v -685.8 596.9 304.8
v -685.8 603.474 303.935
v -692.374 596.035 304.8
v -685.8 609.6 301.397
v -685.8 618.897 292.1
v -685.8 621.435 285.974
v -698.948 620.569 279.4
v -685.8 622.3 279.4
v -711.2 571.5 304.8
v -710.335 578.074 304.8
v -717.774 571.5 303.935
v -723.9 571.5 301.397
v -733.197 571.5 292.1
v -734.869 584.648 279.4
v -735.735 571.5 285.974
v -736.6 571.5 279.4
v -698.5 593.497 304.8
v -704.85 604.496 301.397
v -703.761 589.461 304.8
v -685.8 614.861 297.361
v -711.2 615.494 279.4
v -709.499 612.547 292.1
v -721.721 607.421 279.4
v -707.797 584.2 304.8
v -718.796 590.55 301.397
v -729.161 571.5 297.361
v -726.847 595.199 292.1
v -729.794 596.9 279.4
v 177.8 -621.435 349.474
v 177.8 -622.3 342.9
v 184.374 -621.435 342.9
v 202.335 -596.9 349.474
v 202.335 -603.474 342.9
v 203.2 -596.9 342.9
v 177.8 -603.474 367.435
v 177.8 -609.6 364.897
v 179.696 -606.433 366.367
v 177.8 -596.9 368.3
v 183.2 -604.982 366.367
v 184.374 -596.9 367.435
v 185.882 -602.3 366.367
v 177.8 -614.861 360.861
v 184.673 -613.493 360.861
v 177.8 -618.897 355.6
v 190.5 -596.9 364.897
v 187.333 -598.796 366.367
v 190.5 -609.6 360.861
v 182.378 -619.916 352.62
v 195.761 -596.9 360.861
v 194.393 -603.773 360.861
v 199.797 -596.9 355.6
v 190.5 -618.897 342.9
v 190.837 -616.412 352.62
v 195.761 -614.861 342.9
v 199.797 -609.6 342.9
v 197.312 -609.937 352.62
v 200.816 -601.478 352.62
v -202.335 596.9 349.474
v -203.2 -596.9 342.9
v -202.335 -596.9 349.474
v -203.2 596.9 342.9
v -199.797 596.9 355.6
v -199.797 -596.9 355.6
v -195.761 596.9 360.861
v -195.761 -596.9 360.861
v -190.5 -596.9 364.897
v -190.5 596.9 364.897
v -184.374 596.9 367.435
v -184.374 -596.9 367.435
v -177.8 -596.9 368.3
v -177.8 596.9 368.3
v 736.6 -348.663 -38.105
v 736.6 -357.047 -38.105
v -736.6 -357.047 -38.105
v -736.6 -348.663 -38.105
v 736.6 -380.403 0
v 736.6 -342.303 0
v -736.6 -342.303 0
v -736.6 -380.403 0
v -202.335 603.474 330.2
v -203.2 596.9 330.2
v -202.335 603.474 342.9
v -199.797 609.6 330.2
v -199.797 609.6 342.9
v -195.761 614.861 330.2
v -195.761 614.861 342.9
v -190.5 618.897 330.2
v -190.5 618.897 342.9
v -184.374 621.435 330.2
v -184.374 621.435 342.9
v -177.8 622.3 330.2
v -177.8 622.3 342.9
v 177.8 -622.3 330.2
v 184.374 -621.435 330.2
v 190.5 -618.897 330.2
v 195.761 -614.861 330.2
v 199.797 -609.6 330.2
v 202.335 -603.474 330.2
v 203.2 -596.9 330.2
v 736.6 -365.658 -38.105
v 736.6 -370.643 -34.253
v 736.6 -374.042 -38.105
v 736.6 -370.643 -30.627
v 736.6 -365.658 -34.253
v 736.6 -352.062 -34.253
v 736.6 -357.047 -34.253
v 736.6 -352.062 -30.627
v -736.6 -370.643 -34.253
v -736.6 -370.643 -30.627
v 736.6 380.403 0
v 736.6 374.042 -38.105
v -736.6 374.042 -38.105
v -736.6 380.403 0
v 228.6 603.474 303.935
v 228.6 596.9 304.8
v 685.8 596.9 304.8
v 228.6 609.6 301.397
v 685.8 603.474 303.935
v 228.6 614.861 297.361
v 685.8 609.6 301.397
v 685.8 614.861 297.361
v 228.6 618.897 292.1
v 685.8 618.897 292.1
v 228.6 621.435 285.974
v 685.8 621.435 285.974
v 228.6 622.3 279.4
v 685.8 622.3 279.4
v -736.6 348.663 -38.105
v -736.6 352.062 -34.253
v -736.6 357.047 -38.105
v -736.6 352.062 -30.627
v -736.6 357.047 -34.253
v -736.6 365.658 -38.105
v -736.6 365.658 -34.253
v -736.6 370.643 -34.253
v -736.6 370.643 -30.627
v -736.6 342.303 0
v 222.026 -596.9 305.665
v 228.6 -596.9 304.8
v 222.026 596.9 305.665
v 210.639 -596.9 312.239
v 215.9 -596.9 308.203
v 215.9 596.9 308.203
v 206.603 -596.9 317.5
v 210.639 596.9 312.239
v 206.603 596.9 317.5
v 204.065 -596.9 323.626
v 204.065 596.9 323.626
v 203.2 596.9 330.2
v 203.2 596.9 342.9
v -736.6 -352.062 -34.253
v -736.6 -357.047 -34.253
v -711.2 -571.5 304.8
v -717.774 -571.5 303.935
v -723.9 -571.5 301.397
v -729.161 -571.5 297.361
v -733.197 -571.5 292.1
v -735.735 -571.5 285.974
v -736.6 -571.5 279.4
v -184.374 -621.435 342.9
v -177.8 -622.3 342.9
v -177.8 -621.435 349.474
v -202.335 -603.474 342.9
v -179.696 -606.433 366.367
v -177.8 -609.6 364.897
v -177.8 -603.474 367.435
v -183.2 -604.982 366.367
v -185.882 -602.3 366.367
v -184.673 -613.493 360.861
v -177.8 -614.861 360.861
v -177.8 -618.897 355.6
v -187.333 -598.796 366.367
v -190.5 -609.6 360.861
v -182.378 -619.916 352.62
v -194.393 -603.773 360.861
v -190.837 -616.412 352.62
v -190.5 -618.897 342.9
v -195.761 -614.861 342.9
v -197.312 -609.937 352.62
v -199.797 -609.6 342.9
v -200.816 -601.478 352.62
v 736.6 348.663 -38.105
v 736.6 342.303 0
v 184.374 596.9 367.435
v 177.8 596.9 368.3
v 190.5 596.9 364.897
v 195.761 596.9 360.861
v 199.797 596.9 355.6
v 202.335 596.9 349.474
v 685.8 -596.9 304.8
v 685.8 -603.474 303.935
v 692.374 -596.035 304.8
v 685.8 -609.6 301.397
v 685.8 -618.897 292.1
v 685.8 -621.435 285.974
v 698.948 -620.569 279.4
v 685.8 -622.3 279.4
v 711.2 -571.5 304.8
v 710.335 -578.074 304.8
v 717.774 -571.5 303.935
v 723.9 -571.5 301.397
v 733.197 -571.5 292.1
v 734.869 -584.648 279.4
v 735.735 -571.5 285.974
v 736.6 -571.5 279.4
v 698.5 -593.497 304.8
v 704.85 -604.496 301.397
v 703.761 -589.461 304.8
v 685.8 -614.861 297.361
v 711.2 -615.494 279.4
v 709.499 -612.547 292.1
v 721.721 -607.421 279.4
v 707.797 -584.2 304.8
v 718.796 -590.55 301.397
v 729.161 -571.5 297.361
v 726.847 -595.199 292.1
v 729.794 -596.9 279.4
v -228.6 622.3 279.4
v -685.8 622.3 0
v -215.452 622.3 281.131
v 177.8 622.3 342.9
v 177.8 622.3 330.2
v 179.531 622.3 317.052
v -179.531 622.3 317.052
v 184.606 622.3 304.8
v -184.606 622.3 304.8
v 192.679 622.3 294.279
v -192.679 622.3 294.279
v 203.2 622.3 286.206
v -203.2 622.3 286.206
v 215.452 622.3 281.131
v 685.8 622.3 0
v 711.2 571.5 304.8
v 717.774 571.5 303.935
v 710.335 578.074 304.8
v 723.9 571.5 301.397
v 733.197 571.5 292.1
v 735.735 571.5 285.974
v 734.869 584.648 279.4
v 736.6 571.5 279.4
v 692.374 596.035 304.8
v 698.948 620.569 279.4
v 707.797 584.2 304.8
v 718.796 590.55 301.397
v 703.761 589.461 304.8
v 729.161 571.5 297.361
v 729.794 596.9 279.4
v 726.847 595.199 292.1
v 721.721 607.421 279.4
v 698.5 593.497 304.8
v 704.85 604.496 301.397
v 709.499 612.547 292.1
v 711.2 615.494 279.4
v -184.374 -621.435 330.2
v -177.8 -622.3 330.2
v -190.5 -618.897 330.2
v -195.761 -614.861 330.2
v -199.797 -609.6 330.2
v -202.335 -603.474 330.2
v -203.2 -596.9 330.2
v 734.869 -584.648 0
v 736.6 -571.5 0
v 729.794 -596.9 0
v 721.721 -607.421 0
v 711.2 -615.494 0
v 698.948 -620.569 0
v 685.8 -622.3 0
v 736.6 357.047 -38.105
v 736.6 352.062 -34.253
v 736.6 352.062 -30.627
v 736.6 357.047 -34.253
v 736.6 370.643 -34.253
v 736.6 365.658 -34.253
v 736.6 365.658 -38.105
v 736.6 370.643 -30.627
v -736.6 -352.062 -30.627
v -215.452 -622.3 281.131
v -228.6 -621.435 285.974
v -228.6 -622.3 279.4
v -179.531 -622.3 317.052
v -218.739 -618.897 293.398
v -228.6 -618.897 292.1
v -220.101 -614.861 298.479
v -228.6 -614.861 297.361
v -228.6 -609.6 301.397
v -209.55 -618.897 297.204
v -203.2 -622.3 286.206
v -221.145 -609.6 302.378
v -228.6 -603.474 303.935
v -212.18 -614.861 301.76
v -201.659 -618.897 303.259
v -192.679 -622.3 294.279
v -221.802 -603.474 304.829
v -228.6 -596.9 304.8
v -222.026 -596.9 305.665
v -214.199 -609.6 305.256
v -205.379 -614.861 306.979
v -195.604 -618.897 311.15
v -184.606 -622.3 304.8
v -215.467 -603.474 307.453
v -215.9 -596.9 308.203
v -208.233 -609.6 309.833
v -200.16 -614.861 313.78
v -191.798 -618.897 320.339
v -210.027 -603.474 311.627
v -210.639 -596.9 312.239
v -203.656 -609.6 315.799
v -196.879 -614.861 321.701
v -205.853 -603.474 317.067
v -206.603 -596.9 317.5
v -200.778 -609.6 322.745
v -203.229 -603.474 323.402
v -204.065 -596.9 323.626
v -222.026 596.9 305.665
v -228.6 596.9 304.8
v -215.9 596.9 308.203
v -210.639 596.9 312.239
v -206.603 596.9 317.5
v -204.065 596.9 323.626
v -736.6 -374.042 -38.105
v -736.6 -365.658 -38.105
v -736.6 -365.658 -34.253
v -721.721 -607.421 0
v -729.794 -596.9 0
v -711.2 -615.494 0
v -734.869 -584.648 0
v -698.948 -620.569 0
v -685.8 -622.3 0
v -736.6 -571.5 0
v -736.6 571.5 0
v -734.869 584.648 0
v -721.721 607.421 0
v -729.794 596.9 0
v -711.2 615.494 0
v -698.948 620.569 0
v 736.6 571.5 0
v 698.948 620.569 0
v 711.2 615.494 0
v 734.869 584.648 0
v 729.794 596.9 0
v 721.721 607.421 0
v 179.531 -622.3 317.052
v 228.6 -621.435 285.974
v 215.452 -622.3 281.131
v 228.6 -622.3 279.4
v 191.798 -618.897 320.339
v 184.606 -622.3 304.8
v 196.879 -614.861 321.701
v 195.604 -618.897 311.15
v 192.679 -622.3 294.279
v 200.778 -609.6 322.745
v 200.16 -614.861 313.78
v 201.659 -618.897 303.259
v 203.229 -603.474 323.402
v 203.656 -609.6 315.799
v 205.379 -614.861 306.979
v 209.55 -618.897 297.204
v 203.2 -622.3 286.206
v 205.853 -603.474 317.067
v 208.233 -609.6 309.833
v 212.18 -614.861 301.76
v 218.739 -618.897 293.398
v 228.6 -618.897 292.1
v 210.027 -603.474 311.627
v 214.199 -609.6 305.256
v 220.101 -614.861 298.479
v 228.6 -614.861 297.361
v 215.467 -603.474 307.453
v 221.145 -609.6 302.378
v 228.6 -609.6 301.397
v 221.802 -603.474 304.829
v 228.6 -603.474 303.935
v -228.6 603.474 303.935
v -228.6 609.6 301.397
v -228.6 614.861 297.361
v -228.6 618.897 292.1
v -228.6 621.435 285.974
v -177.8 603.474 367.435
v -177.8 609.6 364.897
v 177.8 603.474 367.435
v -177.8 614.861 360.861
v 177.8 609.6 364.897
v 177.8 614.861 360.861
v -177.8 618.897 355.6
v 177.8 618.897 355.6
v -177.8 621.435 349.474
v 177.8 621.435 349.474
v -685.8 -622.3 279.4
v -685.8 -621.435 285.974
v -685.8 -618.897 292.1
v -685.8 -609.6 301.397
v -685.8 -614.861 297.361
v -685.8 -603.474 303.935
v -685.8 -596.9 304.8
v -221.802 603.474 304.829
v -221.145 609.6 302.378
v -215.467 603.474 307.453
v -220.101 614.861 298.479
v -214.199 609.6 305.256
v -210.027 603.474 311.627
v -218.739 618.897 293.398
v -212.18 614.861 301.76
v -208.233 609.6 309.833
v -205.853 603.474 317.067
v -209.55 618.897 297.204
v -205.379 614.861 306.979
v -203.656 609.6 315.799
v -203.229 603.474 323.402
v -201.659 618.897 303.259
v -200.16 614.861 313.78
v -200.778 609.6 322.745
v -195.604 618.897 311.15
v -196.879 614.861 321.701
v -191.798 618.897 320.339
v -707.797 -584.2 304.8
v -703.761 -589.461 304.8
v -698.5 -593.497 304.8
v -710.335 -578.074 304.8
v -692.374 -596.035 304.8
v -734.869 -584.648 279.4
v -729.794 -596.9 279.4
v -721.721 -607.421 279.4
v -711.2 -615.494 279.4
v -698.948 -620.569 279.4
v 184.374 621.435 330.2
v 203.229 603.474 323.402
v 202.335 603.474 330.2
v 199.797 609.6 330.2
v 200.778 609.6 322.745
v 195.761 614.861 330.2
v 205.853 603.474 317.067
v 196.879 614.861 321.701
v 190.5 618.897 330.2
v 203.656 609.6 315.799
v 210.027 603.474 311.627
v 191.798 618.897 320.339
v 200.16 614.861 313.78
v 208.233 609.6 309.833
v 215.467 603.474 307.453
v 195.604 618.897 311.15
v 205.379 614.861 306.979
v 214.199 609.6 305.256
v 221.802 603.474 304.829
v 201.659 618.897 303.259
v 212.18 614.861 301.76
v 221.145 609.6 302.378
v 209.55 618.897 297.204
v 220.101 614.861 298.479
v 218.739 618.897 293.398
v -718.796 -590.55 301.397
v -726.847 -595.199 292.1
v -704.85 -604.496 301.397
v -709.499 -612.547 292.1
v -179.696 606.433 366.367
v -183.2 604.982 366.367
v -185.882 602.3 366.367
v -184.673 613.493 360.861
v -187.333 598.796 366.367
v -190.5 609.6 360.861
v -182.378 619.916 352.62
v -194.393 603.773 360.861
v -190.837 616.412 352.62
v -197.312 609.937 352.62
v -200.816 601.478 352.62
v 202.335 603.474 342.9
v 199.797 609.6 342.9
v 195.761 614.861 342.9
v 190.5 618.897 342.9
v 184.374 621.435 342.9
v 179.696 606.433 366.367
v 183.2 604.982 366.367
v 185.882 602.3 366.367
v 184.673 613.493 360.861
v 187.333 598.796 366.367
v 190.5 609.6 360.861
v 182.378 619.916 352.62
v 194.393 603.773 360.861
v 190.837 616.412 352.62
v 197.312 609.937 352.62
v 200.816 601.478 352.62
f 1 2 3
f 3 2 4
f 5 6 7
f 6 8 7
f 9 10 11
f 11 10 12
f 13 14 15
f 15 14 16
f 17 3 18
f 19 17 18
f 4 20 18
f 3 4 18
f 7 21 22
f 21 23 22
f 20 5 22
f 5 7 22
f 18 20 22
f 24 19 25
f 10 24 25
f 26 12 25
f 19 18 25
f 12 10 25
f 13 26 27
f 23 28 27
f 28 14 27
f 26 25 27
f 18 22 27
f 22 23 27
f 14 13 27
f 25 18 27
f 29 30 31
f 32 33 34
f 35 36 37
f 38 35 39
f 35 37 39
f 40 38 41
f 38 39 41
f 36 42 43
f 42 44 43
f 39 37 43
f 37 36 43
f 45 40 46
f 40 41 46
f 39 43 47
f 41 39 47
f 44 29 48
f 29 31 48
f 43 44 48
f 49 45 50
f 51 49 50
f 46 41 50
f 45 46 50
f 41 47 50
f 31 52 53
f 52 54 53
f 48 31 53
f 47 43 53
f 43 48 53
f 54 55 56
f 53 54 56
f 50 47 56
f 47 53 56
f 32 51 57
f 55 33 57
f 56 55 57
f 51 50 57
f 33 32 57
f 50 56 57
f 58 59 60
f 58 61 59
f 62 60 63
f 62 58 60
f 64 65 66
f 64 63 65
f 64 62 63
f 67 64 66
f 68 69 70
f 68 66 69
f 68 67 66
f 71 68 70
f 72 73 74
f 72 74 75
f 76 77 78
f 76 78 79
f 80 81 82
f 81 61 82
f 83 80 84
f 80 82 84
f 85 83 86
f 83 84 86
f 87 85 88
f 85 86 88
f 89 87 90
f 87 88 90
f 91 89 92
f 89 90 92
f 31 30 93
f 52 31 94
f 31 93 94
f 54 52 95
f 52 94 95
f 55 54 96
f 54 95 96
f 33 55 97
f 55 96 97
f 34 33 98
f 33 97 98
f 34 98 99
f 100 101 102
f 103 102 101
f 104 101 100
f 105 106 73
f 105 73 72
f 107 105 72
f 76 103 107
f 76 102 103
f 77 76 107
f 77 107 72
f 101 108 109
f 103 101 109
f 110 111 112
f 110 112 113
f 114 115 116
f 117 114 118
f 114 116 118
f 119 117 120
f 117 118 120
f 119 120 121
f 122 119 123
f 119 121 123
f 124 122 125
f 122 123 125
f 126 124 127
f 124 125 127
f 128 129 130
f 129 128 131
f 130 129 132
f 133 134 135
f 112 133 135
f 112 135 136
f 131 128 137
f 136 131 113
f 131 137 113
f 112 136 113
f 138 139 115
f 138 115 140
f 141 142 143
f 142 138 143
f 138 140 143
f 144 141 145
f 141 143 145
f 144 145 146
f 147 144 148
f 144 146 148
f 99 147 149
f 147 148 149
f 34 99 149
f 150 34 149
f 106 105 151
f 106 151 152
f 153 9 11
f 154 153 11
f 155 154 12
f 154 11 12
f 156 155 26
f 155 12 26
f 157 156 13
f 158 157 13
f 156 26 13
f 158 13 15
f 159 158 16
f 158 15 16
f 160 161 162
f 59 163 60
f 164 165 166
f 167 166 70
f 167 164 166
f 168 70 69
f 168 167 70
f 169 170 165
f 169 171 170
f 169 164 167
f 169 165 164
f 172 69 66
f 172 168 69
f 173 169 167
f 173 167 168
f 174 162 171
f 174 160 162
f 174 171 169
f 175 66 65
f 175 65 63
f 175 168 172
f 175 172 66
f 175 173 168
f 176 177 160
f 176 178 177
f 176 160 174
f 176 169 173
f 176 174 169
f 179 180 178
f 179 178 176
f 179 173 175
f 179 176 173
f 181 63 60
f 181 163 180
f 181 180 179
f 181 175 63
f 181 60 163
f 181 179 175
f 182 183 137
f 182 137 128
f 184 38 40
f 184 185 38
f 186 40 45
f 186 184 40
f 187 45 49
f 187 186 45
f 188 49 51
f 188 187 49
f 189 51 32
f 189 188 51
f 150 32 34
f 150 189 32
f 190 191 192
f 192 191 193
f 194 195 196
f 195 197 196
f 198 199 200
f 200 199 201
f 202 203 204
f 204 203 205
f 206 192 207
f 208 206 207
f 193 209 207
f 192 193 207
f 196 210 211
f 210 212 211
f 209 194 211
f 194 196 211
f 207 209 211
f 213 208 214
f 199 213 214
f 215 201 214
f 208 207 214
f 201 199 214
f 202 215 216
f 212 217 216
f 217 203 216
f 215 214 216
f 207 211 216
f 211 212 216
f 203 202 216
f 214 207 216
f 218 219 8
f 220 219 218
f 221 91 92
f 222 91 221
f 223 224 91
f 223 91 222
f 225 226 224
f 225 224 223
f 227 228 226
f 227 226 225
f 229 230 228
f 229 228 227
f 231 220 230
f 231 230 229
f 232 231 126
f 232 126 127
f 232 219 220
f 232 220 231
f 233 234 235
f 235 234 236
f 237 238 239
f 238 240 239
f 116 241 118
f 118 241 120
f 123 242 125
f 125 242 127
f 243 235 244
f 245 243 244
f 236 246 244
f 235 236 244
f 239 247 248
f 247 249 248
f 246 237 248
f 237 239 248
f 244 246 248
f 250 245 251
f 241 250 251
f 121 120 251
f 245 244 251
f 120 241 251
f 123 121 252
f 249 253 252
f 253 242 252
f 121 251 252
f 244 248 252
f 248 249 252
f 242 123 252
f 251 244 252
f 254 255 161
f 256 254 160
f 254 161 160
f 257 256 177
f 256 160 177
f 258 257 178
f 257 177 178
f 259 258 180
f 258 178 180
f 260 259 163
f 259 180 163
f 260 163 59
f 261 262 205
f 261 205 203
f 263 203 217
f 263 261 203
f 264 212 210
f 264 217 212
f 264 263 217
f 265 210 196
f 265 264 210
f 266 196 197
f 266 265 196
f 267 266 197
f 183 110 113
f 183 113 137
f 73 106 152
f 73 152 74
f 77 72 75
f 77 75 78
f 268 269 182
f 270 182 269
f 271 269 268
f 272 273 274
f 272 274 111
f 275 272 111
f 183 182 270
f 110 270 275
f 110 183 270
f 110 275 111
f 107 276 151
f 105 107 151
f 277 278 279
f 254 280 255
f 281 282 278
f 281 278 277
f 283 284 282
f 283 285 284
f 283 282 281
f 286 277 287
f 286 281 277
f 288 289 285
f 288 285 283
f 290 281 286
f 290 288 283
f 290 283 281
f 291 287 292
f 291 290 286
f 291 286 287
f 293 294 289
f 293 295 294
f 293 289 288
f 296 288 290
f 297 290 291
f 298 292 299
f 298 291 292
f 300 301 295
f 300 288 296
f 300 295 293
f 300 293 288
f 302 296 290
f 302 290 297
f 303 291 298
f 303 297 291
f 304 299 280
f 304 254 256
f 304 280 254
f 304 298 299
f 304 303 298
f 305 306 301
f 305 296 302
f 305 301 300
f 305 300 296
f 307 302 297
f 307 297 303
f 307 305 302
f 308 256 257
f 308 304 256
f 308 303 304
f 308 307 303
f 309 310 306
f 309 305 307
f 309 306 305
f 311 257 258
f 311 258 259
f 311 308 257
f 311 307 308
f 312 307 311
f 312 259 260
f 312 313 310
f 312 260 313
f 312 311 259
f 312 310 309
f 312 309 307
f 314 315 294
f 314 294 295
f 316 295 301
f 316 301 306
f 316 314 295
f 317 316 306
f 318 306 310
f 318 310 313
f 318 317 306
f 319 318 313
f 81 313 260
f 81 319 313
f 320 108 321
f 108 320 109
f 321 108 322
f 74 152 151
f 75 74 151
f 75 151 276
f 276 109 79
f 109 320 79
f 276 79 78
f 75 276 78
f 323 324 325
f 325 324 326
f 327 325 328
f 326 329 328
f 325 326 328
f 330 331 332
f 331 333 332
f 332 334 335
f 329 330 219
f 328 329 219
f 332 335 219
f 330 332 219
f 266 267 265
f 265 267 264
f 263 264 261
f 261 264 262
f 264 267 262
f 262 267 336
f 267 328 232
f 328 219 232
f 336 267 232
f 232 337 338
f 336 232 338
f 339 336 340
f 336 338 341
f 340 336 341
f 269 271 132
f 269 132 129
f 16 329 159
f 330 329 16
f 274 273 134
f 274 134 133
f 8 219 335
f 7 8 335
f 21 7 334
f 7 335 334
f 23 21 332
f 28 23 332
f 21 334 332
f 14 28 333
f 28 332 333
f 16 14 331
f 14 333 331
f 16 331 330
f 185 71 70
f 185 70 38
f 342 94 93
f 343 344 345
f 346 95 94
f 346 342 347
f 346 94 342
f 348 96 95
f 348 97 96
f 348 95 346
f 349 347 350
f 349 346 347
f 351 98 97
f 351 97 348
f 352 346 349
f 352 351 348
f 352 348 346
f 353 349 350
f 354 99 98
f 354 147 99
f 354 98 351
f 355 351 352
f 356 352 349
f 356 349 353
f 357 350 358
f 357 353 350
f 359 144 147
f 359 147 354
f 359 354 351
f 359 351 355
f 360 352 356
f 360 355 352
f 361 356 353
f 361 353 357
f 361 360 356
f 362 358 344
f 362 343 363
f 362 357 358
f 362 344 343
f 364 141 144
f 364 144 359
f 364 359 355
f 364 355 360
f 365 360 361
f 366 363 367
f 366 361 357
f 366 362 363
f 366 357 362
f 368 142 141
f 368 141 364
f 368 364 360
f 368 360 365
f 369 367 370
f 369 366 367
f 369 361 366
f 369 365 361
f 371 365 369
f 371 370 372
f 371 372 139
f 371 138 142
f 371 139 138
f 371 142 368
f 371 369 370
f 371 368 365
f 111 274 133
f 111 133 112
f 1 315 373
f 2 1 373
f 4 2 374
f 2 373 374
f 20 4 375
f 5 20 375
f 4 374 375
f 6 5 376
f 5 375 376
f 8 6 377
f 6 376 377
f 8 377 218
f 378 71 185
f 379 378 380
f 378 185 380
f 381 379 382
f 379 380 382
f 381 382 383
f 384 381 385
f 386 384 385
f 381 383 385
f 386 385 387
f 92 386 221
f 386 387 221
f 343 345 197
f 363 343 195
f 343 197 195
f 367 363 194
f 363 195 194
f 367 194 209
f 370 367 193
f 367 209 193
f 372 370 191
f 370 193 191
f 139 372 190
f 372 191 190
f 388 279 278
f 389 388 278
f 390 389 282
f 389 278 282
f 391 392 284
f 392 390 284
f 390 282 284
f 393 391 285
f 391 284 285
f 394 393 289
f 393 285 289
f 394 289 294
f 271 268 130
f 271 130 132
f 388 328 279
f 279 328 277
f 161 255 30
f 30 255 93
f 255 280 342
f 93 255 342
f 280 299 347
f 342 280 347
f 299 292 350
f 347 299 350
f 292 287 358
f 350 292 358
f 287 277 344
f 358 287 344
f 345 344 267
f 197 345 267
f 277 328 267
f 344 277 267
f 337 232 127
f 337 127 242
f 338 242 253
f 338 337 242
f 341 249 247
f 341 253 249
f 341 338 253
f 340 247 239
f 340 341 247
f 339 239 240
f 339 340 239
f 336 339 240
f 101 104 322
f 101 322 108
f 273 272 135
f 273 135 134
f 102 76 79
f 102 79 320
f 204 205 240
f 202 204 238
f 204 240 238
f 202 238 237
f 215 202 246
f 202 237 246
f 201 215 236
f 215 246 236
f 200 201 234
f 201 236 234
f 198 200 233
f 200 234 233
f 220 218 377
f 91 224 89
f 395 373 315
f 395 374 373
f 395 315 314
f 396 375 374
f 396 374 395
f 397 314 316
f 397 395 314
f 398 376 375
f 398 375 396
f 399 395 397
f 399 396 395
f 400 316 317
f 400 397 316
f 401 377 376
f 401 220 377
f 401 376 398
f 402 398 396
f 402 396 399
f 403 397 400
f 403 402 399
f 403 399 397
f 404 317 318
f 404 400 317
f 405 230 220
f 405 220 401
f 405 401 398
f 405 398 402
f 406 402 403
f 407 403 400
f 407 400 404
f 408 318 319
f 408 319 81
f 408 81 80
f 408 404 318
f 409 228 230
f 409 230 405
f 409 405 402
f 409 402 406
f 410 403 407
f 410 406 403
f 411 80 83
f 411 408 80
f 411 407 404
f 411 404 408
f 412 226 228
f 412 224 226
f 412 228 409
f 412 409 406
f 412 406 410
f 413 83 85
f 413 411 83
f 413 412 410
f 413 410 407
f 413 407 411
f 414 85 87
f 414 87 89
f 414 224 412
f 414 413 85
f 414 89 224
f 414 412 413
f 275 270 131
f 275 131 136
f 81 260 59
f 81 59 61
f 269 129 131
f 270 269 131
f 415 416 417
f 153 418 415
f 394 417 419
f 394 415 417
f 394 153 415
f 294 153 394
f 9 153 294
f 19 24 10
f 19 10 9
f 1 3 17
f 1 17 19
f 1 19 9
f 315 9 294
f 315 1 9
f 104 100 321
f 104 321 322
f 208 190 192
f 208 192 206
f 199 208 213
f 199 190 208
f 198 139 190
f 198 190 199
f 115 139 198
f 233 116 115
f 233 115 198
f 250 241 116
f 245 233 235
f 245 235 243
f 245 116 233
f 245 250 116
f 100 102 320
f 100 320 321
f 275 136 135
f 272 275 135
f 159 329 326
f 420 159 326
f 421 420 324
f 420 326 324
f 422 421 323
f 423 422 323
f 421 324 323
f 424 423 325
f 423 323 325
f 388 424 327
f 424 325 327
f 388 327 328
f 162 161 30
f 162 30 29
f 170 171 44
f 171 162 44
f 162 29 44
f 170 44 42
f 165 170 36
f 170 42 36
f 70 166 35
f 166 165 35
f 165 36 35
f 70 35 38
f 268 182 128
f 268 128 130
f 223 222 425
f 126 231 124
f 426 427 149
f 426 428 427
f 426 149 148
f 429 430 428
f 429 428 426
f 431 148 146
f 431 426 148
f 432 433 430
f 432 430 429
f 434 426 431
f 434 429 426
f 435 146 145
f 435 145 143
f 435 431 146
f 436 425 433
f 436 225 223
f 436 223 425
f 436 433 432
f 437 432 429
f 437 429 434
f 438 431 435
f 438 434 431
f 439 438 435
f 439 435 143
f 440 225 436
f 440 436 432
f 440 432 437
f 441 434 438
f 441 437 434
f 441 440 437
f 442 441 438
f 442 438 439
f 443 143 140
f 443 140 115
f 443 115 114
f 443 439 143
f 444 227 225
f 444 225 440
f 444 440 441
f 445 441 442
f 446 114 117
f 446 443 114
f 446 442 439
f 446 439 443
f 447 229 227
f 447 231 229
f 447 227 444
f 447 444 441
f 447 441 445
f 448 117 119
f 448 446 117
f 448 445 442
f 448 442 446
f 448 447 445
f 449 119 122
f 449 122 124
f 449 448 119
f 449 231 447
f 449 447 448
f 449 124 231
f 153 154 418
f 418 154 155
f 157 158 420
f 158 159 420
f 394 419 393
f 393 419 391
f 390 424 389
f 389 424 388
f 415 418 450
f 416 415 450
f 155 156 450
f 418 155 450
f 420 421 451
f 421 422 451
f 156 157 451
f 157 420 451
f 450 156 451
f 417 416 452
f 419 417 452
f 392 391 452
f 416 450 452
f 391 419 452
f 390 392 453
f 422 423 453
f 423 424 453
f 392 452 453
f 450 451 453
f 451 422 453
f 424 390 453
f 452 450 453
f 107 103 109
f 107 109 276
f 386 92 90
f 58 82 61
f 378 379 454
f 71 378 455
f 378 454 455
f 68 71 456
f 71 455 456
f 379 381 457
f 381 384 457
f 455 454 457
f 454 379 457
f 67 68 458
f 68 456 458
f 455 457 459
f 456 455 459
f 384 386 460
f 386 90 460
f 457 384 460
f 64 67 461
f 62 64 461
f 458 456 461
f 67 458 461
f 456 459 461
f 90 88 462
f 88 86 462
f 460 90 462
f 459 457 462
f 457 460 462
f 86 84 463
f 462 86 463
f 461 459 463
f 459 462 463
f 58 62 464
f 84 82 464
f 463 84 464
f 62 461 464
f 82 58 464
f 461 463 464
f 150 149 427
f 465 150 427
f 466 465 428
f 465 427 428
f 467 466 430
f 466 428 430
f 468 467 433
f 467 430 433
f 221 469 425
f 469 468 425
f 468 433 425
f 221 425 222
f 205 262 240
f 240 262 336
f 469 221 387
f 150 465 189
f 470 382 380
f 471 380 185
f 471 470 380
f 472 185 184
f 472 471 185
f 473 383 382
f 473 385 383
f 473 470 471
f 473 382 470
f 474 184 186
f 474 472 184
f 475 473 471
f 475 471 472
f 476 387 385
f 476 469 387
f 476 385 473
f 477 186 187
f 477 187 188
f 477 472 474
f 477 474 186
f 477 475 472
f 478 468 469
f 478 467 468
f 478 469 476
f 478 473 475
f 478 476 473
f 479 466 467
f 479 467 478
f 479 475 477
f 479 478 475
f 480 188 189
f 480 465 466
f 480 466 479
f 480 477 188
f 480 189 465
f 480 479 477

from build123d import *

# Parameters (mm, degrees)
F0_W         = 1473.2
F0_H         = 1244.6
F1_DEPTH     = 304.8
F2_W         = 406.4
F2_H         = 1244.6
F3_DEPTH     = 63.5
F5_F1_R      = 25.4
F5_F2_R      = 25.4
F6_T1_DEPTH  = 431.8
F6_T4_ANGLE  = 90
F6_T6_ANGLE  = 90
F6_T8_ANGLE  = 90
F6_T10_ANGLE = 90
F8_DEPTH     = 1473.2


# Not quite as in the source:
# - a fillet or chamfer that OpenCascade refuses, or shapes differently, is made with other operations: its cross-section is extruded or revolved along the edge and cut away or added
# - a feature of the source that left no trace in its solid (it failed there, or was rolled back) is left out


with BuildPart() as f1:
    # F0 (on Top) → F1 (new body)
    with BuildSketch(Plane.XY):
        Rectangle(F0_W, F0_H)
    extrude(amount=F1_DEPTH)

    # F2 (on face) → F3 (join)
    with BuildSketch(Plane.XY.offset(304.8)):
        Rectangle(F2_W, F2_H)
    extrude(amount=F3_DEPTH)

    # F5: fillet of radius 25.4 on 12 edges, made by hand

    # F5_f1
    f5_f1_edges = [f1.edges().sort_by_distance(p)[0] for p in [
        (-203.2, 0, 304.8),
        (203.2, 0, 304.8),
    ]]
    fillet(f5_f1_edges, radius=F5_F1_R)

    # F5_f2
    f5_f2_edges = [f1.edges().sort_by_distance(p)[0] for p in [
        (-482.6, -622.3, 304.8),
        (482.6, -622.3, 304.8),
        (736.6, 0, 304.8),
        (482.6, 622.3, 304.8),
        (-482.6, 622.3, 304.8),
        (-736.6, 0, 304.8),
        (0, 622.3, 368.3),
        (0, -622.3, 368.3),
        (-203.2, 0, 368.3),
        (203.2, 0, 368.3),
        (-210.6394877579, 622.3, 312.2394877579),
        (210.6394877579, 622.3, 312.2394877579),
        (210.6394877579, -622.3, 312.2394877579),
        (-210.6394877579, -622.3, 312.2394877579),
    ]]
    fillet(f5_f2_edges, radius=F5_F2_R)

    # F6: fillet of radius 50.8 on 4 edges, made by hand

    # F6_s2 → F6_t1 (cut)
    with BuildSketch(Plane.XY.offset(-127)):
        with BuildLine():
            ThreePointArc((736.6, -571.5), (721.7210244843, -607.4210244843), (685.8, -622.3))
            Line((685.8, -622.3), (736.6, -622.3))
            Line((736.6, -622.3), (736.6, -571.5))
        make_face()
        with BuildLine():
            ThreePointArc((685.8, 622.3), (721.7210244843, 607.4210244843), (736.6, 571.5))
            Line((736.6, 571.5), (736.6, 622.3))
            Line((736.6, 622.3), (685.8, 622.3))
        make_face()
        with BuildLine():
            ThreePointArc((-685.8, 622.3), (-721.7210244843, 607.4210244843), (-736.6, 571.5))
            Line((-736.6, 571.5), (-736.6, 622.3))
            Line((-736.6, 622.3), (-685.8, 622.3))
        make_face()
        with BuildLine():
            ThreePointArc((-736.6, -571.5), (-721.7210244843, -607.4210244843), (-685.8, -622.3))
            Line((-685.8, -622.3), (-736.6, -622.3))
            Line((-736.6, -622.3), (-736.6, -571.5))
        make_face()
    extrude(amount=F6_T1_DEPTH, mode=Mode.SUBTRACT)

    # F6_s3 → F6_t4 (revolve, cut)
    with BuildSketch(Plane.XZ.offset(571.5)):
        with BuildLine():
            ThreePointArc((-711.2, 304.8), (-729.1605122421, 297.3605122421), (-736.6, 279.4))
            Line((-736.6, 279.4), (-736.6, 304.8))
            Line((-736.6, 304.8), (-711.2, 304.8))
        make_face()
    revolve(axis=Axis((-685.8, -571.5, 304.8), (0, 0, 1)), revolution_arc=F6_T4_ANGLE, mode=Mode.SUBTRACT)

    # F6_s5 → F6_t6 (revolve, cut)
    with BuildSketch(Plane.YZ.offset(-685.8)):
        with BuildLine():
            ThreePointArc((596.9, 304.8), (614.8605122421, 297.3605122421), (622.3, 279.4))
            Line((622.3, 279.4), (622.3, 304.8))
            Line((622.3, 304.8), (596.9, 304.8))
        make_face()
    revolve(axis=Axis((-685.8, 571.5, 304.8), (0, 0, 1)), revolution_arc=F6_T6_ANGLE, mode=Mode.SUBTRACT)

    # F6_s7 → F6_t8 (revolve, cut)
    with BuildSketch(Plane.XZ.offset(-571.5)):
        with BuildLine():
            ThreePointArc((711.2, 304.8), (729.1605122421, 297.3605122421), (736.6, 279.4))
            Line((736.6, 279.4), (736.6, 304.8))
            Line((736.6, 304.8), (711.2, 304.8))
        make_face()
    revolve(axis=Axis((685.8, 571.5, 304.8), (0, 0, 1)), revolution_arc=F6_T8_ANGLE, mode=Mode.SUBTRACT)

    # F6_s9 → F6_t10 (revolve, cut)
    with BuildSketch(Plane.YZ.offset(685.8)):
        with BuildLine():
            ThreePointArc((-596.9, 304.8), (-614.8605122421, 297.3605122421), (-622.3, 279.4))
            Line((-622.3, 279.4), (-622.3, 304.8))
            Line((-622.3, 304.8), (-596.9, 304.8))
        make_face()
    revolve(axis=Axis((685.8, -571.5, 304.8), (0, 0, 1)), revolution_arc=F6_T10_ANGLE, mode=Mode.SUBTRACT)


with BuildPart() as f8:
    # F7 (on face) → F8 (new body)
    with BuildSketch(Plane.YZ.offset(736.6)):
        Polygon((-342.3026821136, 0), (-361.3526821136, 0), (-380.4026821136, 0), (-374.042391777, -38.1048284471), (-365.658134222, -38.1048284471), (-365.658134222, -34.2525914311), (-370.6433773041, -34.2525914311), (-370.6433773041, -30.6269582361), (-361.3526821136, -30.6269582361), (-352.0619869232, -30.6269582361), (-352.0619869232, -34.2525914311), (-357.0472300053, -34.2525914311), (-357.0472300053, -38.1048284471), (-348.6629724503, -38.1048284471), align=None)
    extrude(amount=-F8_DEPTH)


with BuildPart() as f8b:
    # F7 (on face) → F8, piece 2 (new body)
    with BuildSketch(Plane.YZ.offset(736.6)):
        Polygon((361.3526821136, 0), (342.3026821136, 0), (348.6629724503, -38.1048284471), (357.0472300053, -38.1048284471), (357.0472300053, -34.2525914311), (352.0619869232, -34.2525914311), (352.0619869232, -30.6269582361), (361.3526821136, -30.6269582361), (370.6433773041, -30.6269582361), (370.6433773041, -34.2525914311), (365.658134222, -34.2525914311), (365.658134222, -38.1048284471), (374.042391777, -38.1048284471), (380.4026821136, 0), align=None)
    extrude(amount=-F8_DEPTH)


solid = Compound([f1.part, f8.part, f8b.part])
